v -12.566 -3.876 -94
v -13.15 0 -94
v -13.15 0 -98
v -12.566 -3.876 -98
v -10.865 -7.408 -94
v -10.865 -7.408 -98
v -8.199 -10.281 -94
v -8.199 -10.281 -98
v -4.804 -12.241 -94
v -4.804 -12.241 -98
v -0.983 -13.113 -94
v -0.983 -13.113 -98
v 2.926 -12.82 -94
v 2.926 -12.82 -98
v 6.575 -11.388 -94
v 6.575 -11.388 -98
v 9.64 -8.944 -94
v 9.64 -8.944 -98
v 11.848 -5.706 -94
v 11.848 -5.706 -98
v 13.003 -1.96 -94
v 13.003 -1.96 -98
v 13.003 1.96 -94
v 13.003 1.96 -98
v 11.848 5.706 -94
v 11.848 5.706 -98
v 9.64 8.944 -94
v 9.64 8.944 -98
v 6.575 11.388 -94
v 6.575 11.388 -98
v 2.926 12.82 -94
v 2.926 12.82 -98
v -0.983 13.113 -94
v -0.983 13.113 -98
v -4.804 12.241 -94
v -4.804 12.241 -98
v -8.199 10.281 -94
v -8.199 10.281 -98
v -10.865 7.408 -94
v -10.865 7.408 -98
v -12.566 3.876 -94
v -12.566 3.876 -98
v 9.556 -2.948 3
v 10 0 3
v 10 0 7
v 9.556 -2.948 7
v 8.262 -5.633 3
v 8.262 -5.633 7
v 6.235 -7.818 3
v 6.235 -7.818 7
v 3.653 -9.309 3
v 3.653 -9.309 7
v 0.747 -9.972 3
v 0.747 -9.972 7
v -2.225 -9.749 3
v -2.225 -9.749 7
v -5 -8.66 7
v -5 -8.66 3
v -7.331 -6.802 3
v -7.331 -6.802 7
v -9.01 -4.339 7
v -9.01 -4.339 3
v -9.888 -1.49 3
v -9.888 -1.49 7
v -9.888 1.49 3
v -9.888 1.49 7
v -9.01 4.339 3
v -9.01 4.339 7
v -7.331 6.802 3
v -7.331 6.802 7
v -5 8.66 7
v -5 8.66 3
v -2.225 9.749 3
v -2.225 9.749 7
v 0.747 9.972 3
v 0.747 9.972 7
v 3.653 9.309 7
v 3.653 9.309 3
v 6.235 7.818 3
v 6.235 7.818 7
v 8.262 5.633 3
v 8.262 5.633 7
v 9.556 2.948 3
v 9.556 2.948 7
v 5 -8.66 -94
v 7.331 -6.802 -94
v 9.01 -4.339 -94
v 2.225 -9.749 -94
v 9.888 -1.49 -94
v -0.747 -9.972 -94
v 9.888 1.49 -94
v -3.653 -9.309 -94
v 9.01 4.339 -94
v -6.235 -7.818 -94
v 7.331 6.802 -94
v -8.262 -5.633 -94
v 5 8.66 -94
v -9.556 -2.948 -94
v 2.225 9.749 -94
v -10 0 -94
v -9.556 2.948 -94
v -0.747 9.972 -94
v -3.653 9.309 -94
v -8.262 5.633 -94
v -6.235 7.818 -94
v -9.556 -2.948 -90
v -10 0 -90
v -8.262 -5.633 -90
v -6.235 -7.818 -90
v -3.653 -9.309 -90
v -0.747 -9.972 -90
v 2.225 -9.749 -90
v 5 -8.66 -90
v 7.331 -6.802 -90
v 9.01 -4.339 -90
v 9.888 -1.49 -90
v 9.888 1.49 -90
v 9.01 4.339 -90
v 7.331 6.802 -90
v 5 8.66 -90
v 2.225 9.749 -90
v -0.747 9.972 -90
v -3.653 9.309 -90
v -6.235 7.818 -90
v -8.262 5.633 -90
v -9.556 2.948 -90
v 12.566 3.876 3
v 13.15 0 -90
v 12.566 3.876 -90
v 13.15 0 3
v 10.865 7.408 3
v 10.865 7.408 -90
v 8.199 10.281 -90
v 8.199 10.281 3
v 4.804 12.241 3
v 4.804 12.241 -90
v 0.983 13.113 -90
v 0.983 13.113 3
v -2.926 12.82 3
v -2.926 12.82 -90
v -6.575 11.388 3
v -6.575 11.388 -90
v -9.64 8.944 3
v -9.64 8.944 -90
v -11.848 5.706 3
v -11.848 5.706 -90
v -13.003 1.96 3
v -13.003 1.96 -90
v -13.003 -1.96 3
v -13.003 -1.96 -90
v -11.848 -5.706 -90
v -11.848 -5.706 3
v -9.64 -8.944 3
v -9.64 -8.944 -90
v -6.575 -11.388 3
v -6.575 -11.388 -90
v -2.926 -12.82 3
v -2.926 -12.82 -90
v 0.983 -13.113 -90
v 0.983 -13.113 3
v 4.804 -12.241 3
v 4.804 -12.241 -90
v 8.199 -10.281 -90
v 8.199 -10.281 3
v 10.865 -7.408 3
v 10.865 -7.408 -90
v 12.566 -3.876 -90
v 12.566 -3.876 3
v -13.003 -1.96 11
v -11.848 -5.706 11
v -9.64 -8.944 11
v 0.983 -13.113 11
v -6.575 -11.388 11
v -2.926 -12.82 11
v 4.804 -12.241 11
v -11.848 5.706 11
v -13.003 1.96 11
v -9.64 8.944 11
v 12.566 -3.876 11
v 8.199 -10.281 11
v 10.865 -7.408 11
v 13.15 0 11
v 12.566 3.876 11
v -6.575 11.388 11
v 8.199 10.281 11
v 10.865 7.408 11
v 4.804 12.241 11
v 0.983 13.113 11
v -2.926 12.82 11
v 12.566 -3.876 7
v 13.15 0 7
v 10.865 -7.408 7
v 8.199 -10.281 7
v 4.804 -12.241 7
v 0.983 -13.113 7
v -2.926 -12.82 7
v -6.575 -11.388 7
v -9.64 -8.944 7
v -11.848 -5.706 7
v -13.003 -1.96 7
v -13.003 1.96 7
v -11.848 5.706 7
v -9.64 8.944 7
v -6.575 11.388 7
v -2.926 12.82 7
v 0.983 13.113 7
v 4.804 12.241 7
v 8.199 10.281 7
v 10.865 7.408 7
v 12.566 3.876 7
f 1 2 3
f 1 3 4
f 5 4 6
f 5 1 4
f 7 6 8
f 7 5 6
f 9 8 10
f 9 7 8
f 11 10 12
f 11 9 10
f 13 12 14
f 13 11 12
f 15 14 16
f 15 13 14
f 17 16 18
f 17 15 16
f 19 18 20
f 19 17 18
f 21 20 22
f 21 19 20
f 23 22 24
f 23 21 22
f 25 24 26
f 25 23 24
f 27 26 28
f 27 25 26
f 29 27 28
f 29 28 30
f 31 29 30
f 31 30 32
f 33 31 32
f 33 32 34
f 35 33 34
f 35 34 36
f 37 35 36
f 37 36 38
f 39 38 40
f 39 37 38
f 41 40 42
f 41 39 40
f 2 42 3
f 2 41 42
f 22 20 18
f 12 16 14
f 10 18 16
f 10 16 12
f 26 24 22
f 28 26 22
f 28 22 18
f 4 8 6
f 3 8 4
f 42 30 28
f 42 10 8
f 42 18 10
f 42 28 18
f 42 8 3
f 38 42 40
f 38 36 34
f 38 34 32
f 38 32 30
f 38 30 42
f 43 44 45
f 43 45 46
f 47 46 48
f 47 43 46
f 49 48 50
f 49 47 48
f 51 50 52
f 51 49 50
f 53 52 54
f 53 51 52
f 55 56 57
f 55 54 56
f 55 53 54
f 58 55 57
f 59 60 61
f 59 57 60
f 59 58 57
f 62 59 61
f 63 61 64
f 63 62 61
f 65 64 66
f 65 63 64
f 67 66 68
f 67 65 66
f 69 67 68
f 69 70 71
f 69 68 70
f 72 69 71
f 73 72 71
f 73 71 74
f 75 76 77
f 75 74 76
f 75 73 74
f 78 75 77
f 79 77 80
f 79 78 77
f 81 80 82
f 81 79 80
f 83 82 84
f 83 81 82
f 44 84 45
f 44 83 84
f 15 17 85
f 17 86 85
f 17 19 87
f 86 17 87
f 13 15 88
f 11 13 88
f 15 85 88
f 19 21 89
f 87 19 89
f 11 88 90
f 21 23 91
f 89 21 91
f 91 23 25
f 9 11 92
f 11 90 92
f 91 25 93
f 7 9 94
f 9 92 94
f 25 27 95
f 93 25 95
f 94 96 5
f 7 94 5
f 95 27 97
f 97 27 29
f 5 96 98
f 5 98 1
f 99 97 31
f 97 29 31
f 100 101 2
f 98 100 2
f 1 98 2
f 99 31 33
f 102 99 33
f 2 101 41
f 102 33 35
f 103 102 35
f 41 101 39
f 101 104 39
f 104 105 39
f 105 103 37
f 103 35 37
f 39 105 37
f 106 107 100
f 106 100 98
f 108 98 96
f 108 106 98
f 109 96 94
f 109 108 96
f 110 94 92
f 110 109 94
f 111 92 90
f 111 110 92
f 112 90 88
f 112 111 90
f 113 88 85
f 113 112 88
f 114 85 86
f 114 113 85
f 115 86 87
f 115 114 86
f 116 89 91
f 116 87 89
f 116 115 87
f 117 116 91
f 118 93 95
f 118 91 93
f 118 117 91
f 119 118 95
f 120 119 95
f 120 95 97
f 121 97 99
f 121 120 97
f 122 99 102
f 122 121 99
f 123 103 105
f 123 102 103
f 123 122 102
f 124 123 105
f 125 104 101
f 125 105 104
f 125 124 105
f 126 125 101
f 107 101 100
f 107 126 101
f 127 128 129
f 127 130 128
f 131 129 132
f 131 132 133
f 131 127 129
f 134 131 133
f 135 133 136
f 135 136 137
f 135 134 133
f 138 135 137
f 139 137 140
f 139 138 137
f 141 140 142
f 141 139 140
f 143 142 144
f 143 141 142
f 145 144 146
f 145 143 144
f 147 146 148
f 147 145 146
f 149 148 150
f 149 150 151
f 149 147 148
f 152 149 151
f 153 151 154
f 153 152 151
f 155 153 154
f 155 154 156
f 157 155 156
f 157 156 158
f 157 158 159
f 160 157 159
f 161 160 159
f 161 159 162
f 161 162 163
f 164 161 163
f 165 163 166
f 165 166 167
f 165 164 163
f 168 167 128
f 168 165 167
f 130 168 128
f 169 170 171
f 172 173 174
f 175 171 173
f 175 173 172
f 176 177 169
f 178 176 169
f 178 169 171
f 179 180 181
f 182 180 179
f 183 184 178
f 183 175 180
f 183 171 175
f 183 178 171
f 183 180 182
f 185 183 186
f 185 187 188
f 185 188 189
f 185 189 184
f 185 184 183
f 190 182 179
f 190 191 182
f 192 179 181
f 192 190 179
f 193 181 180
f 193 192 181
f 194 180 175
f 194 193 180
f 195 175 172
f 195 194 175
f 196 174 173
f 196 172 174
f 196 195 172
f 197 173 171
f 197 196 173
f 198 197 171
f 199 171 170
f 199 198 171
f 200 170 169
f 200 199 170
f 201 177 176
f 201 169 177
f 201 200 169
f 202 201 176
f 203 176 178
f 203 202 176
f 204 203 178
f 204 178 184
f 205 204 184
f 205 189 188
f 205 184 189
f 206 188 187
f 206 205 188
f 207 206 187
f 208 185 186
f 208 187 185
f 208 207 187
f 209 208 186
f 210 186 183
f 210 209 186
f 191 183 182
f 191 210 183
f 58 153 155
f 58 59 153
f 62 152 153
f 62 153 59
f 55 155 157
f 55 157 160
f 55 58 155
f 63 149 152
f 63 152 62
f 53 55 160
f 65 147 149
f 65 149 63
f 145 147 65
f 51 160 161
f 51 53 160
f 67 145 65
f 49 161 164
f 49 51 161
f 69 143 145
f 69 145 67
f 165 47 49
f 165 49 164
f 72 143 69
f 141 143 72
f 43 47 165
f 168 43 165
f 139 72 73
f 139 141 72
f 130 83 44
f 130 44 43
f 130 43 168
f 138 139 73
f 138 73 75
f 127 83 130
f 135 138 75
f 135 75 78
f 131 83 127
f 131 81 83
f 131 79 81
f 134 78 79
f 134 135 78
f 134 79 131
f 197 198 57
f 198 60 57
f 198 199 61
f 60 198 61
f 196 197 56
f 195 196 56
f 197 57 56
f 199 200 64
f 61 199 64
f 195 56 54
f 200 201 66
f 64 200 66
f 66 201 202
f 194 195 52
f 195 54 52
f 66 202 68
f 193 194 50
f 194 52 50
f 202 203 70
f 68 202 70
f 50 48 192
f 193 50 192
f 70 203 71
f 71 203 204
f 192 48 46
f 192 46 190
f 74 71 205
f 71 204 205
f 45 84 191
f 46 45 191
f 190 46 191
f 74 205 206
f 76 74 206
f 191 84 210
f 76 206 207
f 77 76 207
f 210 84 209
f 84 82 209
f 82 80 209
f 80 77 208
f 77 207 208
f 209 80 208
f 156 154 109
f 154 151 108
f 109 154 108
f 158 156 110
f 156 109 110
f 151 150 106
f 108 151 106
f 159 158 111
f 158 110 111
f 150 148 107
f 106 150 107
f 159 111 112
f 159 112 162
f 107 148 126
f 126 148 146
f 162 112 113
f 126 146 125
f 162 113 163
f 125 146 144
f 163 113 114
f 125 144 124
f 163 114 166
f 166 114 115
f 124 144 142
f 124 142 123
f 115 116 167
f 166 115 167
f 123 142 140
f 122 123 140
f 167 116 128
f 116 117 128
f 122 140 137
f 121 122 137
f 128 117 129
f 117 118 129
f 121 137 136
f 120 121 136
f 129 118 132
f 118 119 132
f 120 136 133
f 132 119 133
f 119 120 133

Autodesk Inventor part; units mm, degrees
ref_plane "YZ Plane" through (0, 0, 0) normal (1, 0, 0) x (0, 1, 0)
ref_plane "Work Plane1" through (0, 0, 0) normal (0, 0, 1) x (1, 0, 0)
sketch "Sketch1" plane through (0, 0, 0) normal (0, 0, 1) x (1, 0, 0)
  circle A0 centre (0, -19) radius 4.7
  circle A1 centre (19, 0) radius 4.7
  circle A2 centre (0, 19) radius 4.7
  circle A3 centre (-19, 0) radius 4.7
  circle A4 centre (0, 0) radius 13.5
  circle A5 centre (-13.435, 13.435) radius 4.7
  circle A6 centre (13.435, 13.435) radius 4.7
  circle A7 centre (13.435, -13.435) radius 4.7
  circle A8 centre (-13.435, -13.435) radius 4.7
  circle A9 centre (0, 0) radius 13.15
  point P0 (0, 0)
  dimension "d0" = 0.35
  dimension "d16" = 9.4
  dimension "d17" = 27
  dimension "d18" = 14.542
  dimension "d19" = 14.542
  dimension "d20" = 26.8701
  dimension "d21" = 19
  dimension "d22" = 26.8701
  dimension "d23" = 35.1074
  dimension "d24" = 38
  dimension "d25" = 26.8701
  dimension "d26" = 14.542
  dimension "d27" = 19
  dimension "d28" = 35.1074
  dimension "d29" = 26.8701
  dimension "d30" = 35.1074
  dimension "d31" = 38
  dimension "d32" = 26.8701
ref_plane "Work Plane2" through (-20, -20, -70) normal (0, 0, -1) x (0, 1, 0)
ref_plane "Work Plane3" through (-25, -81.8654, -89) normal (0, 0, -1) x (0, 1, 0)
extrude "Extrusion1" add sketch "Sketch1" against normal blind 90 contours A9
move faces "Move1" translate (0, 0, 3) faces at (-4.0086, 0.988, 0)
sketch "Sketch5" plane through (0, 0, 3) normal (0, 0, 1) x (1, 0, 0)
  circle A0 centre (0, 0) radius 10
  point P0 (0, 0)
  dimension "d11" = 20
extrude "Extrusion4" add sketch "Sketch5" along normal blind 4
sketch "Sketch6" plane through (0, 0, 7) normal (0, 0, 1) x (1, 0, 0)
  circle A0 centre (0, 0) radius 13.15 projected
  point P0 (0, 0)
extrude "Extrusion5" add sketch "Sketch6" along normal blind 4
sketch "Sketch7" plane through (0, 0, -90) normal (0, 0, -1) x (-1, 0, 0)
  circle A0 centre (0, 0) radius 13.15 projected
  circle A1 centre (0, 0) radius 10
  point P0 (0, 0)
  dimension "d35" = 20
extrude "Extrusion6" add sketch "Sketch7" along normal blind 4 contours A1
sketch "Sketch8" plane through (0, 0, -94) normal (0, 0, -1) x (-1, 0, 0)
  circle A0 centre (0, 0) radius 13.15 projected
  point P0 (0, 0)
extrude "Extrusion7" add sketch "Sketch8" along normal blind 4
properties part number "axle-upper_3DPrint"
